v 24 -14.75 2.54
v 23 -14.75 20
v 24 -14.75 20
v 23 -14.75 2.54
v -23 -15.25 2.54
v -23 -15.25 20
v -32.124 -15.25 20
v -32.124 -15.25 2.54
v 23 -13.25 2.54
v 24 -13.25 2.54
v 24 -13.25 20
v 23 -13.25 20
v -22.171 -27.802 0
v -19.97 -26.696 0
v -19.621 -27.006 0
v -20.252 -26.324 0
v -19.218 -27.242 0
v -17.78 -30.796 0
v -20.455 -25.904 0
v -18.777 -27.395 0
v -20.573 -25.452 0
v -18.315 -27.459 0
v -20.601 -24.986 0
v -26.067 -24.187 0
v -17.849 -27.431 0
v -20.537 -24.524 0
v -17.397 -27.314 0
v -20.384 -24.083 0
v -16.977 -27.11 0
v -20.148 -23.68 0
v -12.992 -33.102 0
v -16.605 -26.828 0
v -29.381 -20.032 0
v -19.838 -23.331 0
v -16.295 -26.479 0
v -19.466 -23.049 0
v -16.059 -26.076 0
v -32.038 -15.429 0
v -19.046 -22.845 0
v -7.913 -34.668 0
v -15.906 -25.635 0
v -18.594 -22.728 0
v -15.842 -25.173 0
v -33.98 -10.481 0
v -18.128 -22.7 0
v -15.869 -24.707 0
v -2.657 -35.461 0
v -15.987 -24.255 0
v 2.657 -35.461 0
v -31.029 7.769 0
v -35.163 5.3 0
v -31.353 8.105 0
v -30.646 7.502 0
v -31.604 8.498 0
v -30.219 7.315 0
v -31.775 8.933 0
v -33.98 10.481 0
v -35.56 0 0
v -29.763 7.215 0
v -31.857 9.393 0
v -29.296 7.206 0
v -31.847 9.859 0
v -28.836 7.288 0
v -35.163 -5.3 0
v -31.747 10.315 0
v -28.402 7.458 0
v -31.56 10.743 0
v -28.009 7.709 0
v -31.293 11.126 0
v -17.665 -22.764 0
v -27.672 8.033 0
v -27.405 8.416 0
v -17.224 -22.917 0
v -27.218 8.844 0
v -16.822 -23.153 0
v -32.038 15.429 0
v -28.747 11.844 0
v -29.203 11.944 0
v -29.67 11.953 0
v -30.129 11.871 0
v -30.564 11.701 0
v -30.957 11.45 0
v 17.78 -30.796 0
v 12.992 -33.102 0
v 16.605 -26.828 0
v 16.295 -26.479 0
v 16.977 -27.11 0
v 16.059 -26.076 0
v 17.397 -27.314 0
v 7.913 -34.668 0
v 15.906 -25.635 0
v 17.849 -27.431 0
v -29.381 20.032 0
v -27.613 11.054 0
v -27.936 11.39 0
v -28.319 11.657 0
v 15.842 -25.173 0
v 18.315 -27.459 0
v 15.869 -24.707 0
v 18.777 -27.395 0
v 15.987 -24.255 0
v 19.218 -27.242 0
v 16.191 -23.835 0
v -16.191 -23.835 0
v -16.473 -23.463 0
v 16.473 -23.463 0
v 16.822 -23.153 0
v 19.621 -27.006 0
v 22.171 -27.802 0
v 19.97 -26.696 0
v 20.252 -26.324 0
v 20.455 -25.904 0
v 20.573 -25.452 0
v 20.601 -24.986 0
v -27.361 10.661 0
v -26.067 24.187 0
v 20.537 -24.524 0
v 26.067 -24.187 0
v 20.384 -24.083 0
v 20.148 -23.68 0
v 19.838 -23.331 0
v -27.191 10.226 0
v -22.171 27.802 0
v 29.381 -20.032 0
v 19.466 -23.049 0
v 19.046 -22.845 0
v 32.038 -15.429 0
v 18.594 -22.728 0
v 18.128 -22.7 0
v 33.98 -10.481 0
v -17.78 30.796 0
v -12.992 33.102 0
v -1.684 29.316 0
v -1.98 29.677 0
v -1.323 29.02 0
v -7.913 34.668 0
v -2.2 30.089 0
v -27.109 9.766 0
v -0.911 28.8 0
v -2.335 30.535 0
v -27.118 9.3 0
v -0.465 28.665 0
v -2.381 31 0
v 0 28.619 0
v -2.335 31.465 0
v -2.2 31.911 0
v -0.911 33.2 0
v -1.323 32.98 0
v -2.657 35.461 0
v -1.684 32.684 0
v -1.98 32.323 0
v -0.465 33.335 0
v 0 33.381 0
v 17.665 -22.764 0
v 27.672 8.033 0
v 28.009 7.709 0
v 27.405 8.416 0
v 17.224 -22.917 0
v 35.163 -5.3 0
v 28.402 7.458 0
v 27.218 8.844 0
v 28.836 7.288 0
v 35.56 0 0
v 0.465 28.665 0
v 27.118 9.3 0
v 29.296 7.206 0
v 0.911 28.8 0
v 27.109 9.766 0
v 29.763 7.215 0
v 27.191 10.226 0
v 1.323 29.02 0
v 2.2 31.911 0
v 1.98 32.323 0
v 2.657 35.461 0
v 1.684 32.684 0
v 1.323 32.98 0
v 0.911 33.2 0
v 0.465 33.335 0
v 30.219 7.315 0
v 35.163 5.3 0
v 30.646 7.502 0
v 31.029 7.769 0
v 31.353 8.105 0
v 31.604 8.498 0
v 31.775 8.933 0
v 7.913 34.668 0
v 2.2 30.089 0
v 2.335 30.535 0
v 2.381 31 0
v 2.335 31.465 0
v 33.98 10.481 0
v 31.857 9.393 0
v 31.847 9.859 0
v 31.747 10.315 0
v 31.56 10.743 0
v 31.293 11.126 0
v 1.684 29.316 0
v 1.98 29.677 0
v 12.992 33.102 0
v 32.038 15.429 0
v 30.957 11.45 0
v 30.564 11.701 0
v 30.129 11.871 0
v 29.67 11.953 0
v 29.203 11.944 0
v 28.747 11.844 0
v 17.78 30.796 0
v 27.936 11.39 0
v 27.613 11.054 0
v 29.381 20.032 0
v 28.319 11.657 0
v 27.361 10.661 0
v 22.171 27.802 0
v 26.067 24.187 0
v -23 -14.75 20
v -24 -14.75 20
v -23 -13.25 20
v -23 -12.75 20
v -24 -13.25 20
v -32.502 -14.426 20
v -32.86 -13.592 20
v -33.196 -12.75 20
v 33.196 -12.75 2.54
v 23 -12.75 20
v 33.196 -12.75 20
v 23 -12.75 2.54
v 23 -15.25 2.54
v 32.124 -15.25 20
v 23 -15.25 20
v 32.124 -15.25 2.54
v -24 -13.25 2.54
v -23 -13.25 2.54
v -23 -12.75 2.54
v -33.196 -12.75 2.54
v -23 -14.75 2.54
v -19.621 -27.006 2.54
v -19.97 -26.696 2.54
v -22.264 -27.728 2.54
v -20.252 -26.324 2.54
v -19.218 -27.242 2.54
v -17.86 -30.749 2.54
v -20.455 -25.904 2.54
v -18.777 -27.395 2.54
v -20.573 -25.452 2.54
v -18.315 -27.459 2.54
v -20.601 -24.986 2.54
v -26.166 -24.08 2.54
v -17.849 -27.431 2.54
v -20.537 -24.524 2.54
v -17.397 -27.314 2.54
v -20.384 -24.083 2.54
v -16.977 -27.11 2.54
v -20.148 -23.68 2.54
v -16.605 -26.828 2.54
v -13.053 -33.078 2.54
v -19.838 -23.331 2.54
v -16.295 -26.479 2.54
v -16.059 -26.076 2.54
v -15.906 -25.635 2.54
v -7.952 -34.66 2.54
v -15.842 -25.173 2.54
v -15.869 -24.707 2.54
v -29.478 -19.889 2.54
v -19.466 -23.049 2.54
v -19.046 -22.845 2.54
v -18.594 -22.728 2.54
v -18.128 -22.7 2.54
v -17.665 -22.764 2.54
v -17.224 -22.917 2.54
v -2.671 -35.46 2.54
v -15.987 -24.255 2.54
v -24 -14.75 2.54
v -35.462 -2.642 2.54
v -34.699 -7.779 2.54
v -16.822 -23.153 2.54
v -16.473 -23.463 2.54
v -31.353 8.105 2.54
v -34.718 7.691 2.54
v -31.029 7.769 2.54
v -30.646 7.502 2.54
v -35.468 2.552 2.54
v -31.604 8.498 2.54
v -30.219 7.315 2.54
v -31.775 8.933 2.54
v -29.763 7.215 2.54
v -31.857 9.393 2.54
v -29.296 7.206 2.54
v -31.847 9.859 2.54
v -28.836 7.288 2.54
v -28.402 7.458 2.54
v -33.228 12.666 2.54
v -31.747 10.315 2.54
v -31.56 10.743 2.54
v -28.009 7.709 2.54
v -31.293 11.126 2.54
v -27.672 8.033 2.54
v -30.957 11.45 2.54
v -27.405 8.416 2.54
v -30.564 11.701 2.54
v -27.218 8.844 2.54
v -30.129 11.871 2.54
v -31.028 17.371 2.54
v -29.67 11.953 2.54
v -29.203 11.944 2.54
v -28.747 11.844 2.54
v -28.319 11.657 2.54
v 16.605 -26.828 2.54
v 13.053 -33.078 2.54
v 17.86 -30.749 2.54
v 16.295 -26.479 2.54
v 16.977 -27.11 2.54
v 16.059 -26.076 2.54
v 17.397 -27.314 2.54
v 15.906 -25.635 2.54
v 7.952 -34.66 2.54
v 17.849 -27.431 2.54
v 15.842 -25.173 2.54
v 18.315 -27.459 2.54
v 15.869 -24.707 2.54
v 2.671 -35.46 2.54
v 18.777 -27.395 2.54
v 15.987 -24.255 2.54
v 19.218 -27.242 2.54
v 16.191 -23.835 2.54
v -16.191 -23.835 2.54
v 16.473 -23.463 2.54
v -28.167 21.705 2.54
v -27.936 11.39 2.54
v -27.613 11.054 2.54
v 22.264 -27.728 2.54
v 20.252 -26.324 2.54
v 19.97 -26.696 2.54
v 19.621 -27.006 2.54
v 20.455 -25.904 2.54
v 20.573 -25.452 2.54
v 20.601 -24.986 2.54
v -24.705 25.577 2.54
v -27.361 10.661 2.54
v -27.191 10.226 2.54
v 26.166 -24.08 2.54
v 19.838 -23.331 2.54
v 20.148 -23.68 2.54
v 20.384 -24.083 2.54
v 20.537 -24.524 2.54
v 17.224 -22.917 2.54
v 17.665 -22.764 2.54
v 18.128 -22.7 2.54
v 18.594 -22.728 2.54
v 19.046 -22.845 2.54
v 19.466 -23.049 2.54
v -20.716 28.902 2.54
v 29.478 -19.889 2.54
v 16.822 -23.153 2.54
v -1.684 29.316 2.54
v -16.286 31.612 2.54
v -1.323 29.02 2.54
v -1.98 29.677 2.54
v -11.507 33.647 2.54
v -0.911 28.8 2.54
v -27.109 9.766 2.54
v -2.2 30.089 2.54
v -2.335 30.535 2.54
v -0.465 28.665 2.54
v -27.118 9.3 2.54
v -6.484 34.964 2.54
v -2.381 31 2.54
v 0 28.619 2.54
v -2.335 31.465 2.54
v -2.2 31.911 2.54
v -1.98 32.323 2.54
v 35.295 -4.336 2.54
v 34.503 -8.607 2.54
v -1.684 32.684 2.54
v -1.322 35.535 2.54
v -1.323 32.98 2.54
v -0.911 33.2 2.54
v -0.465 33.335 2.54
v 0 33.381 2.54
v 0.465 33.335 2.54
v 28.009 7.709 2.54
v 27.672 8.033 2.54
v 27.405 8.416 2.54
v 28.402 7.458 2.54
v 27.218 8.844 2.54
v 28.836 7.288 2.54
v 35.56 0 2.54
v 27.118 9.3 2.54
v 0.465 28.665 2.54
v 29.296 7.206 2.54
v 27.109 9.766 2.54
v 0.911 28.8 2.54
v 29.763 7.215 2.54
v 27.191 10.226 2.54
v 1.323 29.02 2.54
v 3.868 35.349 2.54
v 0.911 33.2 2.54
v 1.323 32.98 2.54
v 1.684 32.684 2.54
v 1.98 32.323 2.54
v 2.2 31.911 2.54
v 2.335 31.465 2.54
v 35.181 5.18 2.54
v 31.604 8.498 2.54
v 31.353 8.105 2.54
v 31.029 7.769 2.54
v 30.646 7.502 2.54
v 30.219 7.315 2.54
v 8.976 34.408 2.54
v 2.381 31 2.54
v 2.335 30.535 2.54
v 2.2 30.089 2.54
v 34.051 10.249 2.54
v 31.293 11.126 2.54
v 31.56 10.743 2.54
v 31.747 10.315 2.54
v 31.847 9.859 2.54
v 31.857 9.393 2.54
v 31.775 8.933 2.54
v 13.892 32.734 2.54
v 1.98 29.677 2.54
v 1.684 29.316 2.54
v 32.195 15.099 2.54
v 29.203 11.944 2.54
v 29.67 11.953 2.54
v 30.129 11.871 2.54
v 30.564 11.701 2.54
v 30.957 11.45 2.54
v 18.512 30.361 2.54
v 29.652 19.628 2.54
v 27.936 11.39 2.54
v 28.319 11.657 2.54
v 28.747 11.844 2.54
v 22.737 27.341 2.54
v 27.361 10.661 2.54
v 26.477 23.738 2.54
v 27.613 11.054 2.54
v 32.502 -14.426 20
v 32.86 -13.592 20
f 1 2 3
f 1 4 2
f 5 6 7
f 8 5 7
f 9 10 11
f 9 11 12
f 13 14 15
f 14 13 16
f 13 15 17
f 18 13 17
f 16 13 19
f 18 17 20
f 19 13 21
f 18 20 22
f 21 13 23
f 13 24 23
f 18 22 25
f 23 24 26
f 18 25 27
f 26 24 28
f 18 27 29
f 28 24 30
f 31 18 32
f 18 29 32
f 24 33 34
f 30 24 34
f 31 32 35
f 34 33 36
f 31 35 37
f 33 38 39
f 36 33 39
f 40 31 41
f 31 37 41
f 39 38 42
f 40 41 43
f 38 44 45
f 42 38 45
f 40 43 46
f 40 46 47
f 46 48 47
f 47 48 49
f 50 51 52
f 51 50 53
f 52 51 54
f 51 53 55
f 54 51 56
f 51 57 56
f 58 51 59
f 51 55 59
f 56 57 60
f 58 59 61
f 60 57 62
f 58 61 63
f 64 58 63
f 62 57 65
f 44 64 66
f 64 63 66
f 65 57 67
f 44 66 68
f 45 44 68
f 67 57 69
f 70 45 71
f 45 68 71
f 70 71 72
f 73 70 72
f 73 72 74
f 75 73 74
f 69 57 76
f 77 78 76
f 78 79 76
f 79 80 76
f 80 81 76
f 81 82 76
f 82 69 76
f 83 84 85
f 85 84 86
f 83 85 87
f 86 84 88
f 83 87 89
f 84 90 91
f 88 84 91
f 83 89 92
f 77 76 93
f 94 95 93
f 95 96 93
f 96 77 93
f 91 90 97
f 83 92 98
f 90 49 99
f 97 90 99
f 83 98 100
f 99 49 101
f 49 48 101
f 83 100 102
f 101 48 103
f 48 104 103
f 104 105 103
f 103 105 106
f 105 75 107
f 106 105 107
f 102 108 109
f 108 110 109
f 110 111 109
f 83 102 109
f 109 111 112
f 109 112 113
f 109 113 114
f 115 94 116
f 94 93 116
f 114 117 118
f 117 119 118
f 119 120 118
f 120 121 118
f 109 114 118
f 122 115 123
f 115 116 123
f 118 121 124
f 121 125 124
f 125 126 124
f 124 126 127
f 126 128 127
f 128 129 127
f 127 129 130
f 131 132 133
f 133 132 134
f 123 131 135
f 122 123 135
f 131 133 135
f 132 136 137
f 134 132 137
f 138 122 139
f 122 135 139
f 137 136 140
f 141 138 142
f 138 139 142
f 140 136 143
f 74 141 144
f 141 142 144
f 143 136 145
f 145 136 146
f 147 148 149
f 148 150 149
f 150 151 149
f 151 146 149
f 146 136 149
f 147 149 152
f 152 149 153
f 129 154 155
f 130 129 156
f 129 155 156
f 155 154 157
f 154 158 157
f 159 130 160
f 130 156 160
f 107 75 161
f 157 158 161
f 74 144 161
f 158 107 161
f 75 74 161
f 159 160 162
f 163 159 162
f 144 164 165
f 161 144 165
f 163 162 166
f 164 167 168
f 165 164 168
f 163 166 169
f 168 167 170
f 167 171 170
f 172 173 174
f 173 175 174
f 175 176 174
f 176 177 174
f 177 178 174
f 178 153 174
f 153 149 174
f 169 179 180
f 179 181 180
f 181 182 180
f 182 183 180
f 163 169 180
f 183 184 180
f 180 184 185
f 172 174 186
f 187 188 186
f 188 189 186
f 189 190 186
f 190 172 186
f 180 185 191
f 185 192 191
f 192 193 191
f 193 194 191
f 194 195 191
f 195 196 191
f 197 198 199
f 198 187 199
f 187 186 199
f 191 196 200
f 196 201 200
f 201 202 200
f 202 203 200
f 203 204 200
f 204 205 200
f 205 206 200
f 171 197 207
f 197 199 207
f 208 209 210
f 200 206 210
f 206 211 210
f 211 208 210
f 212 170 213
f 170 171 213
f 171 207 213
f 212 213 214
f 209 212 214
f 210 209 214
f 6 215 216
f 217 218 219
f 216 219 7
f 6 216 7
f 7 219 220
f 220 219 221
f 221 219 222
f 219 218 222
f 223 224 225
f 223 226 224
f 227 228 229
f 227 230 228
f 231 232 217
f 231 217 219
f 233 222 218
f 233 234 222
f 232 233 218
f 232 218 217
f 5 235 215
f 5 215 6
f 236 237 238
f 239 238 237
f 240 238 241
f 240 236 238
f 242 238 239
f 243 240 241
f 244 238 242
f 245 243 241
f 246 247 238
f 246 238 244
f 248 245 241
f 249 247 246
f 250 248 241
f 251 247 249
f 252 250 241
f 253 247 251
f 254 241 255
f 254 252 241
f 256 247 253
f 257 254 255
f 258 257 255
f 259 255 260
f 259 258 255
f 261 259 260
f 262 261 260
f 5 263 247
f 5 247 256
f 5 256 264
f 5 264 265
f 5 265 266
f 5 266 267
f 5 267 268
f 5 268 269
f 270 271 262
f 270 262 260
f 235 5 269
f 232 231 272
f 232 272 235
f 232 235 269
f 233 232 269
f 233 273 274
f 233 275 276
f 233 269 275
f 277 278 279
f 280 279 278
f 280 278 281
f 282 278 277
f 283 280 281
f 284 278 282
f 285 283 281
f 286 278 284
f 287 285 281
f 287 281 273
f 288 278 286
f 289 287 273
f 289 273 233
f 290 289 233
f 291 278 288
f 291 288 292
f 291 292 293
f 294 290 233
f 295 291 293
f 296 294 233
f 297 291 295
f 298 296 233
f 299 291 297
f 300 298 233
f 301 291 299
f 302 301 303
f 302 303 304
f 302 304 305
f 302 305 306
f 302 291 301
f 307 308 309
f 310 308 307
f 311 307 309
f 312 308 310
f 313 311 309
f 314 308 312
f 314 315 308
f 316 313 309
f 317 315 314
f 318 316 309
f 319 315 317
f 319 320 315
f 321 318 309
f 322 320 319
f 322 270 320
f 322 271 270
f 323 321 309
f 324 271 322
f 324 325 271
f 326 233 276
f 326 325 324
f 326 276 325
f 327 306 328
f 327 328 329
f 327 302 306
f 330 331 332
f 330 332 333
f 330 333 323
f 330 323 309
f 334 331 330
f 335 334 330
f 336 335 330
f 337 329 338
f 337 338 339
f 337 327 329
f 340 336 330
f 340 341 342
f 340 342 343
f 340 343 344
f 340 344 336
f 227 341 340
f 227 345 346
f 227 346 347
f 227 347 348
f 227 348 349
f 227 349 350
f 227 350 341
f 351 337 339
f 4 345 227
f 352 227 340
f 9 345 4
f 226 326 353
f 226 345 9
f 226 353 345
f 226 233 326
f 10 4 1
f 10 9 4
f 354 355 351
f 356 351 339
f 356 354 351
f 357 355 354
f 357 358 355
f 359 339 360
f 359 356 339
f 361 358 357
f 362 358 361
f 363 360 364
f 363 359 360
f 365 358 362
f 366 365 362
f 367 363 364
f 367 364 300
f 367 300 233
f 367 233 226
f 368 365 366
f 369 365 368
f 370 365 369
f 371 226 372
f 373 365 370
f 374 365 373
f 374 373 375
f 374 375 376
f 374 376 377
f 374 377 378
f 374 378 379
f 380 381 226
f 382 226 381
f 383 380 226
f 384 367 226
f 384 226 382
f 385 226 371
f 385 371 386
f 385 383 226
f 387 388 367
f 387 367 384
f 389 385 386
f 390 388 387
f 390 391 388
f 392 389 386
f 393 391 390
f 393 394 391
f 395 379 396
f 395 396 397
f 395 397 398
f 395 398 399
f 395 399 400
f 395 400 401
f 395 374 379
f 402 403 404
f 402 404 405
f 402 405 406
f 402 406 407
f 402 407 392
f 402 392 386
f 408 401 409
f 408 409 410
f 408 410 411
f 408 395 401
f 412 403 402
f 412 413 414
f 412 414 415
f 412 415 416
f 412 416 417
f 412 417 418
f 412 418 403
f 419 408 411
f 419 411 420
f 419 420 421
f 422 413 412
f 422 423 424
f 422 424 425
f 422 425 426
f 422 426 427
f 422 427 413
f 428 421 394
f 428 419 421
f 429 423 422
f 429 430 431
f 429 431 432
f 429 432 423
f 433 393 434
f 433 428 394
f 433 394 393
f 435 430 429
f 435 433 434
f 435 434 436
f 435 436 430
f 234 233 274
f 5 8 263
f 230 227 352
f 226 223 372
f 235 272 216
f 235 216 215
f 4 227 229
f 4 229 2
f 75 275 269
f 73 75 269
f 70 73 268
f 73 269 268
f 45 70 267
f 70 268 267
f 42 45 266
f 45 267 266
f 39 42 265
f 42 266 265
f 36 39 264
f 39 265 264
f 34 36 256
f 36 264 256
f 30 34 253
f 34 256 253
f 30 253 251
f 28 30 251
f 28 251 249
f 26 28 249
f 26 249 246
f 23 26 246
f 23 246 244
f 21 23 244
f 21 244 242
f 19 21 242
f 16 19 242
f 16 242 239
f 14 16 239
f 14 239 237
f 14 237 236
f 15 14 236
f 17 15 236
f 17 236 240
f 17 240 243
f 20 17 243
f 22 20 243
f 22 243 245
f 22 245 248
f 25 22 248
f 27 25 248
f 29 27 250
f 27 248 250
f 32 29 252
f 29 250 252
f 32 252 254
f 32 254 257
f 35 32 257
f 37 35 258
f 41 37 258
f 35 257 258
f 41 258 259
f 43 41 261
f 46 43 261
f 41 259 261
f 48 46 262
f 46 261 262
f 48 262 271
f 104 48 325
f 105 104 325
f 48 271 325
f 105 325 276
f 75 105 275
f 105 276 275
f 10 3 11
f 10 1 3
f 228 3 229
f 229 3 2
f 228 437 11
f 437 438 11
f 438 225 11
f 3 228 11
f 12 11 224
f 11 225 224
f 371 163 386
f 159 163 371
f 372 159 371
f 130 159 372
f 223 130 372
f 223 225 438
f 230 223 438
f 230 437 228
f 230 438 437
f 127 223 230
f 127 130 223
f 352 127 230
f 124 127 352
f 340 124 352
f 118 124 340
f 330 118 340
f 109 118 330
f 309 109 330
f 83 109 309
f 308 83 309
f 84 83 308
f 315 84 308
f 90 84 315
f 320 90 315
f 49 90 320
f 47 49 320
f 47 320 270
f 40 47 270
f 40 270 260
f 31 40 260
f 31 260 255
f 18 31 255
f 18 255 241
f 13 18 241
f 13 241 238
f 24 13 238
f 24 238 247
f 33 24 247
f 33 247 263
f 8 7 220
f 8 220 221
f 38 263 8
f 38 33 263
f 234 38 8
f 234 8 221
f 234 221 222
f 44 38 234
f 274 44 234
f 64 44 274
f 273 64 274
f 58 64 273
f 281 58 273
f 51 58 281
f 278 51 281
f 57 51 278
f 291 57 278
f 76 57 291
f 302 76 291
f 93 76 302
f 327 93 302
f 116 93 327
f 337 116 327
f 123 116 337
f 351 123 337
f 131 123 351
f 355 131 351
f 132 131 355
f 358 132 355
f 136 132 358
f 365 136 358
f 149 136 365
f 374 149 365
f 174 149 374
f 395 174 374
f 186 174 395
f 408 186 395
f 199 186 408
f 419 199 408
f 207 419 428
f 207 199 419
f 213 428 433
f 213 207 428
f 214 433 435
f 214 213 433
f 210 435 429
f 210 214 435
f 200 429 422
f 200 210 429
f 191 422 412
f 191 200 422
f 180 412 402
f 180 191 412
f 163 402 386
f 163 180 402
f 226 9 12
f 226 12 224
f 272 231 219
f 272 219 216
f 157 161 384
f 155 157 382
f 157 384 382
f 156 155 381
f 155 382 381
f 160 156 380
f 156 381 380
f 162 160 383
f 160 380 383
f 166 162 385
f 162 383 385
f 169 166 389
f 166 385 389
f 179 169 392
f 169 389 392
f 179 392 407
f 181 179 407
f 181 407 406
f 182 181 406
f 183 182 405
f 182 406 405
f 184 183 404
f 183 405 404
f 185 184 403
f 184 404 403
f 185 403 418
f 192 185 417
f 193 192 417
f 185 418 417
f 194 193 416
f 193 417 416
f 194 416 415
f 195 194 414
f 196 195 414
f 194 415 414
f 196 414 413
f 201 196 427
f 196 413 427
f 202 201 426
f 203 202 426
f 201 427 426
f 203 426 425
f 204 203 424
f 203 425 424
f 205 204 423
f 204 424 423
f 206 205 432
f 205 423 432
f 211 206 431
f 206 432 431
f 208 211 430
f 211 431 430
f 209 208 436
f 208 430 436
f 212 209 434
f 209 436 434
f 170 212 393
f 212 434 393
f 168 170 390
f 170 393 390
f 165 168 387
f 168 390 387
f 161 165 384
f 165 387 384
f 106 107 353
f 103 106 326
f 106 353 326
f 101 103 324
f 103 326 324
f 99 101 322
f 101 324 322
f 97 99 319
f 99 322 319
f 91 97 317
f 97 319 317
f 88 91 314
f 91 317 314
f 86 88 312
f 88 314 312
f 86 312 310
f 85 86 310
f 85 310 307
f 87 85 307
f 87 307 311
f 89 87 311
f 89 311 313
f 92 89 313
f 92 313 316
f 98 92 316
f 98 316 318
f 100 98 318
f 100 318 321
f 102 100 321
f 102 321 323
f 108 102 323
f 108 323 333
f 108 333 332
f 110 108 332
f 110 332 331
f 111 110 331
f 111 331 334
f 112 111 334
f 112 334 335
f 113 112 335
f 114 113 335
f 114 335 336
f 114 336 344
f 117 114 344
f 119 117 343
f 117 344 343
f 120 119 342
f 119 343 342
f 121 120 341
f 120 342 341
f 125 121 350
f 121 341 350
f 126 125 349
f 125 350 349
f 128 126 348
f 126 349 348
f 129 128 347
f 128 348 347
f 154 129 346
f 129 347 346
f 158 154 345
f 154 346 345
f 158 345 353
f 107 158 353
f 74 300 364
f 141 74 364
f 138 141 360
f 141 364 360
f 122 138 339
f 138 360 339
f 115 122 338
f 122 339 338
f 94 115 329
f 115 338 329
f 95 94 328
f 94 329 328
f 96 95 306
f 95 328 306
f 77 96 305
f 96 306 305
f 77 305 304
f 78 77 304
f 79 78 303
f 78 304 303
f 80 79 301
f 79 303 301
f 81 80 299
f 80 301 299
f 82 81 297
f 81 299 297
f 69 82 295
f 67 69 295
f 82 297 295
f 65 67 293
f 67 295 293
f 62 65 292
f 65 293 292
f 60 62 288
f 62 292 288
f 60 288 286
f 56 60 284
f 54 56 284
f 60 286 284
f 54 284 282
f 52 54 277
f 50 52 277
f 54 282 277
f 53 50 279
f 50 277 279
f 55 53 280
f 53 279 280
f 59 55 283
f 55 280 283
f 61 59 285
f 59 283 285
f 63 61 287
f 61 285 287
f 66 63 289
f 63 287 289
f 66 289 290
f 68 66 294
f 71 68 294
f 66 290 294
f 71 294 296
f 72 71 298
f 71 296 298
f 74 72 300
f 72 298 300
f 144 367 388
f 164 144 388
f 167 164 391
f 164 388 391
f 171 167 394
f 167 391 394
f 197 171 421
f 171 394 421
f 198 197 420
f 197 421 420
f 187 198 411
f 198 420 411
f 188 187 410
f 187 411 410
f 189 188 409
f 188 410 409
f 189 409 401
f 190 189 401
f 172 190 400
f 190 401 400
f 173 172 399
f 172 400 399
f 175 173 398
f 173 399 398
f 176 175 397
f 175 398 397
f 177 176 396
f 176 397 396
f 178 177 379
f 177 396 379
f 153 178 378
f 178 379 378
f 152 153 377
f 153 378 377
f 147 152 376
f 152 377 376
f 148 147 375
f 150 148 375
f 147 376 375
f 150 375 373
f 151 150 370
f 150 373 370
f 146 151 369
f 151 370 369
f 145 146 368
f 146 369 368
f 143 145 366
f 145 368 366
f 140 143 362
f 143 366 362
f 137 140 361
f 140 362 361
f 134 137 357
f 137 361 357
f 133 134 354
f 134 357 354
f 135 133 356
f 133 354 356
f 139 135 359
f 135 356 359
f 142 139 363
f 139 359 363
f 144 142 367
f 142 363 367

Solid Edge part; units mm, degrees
sketch "Sketch1" plane through (0, 0, 0) normal (0, 0, 1) x (1, 0, 0)
  circle A0 centre (0, 0) radius 35.56
extrude "Protrusion1" add sketch "Sketch1" along normal blind 2.54
sketch "Sketch2" plane through (0, 0, 0) normal (0, 0, -1) x (1, 0, 0)
  line L0 (-33.1956, 12.75) -> (-23, 12.75)
  line L1 (-23, 12.75) -> (-23, 13.25)
  line L2 (-23, 13.25) -> (-24, 13.25)
  line L3 (-24, 13.25) -> (-24, 14.75)
  line L4 (-24, 14.75) -> (-23, 14.75)
  line L5 (-23, 14.75) -> (-23, 15.25)
  line L6 (-23, 15.25) -> (-32.124, 15.25)
  arc A0 (-32.124, 15.25) -> (-33.1956, 12.75) centre (0, 0) ccw
extrude "ExtrudedProtrusion_2" add sketch "Sketch2" against normal blind 20
extrude "Cutout1" [suppressed]
hole "Hole_5" at (0, 31, 2.54) direction (0, 0, -1) diameter 4.7625 end up to next
mirror "Mirror1" about plane through (0, 0, 0) normal (1, 0, 0) of "ExtrudedProtrusion_2"
pattern_circular "Pattern1" count 5 over 360 about axis through (0, 0, 2.54) along (0, 0, -1) of "Hole_5"
